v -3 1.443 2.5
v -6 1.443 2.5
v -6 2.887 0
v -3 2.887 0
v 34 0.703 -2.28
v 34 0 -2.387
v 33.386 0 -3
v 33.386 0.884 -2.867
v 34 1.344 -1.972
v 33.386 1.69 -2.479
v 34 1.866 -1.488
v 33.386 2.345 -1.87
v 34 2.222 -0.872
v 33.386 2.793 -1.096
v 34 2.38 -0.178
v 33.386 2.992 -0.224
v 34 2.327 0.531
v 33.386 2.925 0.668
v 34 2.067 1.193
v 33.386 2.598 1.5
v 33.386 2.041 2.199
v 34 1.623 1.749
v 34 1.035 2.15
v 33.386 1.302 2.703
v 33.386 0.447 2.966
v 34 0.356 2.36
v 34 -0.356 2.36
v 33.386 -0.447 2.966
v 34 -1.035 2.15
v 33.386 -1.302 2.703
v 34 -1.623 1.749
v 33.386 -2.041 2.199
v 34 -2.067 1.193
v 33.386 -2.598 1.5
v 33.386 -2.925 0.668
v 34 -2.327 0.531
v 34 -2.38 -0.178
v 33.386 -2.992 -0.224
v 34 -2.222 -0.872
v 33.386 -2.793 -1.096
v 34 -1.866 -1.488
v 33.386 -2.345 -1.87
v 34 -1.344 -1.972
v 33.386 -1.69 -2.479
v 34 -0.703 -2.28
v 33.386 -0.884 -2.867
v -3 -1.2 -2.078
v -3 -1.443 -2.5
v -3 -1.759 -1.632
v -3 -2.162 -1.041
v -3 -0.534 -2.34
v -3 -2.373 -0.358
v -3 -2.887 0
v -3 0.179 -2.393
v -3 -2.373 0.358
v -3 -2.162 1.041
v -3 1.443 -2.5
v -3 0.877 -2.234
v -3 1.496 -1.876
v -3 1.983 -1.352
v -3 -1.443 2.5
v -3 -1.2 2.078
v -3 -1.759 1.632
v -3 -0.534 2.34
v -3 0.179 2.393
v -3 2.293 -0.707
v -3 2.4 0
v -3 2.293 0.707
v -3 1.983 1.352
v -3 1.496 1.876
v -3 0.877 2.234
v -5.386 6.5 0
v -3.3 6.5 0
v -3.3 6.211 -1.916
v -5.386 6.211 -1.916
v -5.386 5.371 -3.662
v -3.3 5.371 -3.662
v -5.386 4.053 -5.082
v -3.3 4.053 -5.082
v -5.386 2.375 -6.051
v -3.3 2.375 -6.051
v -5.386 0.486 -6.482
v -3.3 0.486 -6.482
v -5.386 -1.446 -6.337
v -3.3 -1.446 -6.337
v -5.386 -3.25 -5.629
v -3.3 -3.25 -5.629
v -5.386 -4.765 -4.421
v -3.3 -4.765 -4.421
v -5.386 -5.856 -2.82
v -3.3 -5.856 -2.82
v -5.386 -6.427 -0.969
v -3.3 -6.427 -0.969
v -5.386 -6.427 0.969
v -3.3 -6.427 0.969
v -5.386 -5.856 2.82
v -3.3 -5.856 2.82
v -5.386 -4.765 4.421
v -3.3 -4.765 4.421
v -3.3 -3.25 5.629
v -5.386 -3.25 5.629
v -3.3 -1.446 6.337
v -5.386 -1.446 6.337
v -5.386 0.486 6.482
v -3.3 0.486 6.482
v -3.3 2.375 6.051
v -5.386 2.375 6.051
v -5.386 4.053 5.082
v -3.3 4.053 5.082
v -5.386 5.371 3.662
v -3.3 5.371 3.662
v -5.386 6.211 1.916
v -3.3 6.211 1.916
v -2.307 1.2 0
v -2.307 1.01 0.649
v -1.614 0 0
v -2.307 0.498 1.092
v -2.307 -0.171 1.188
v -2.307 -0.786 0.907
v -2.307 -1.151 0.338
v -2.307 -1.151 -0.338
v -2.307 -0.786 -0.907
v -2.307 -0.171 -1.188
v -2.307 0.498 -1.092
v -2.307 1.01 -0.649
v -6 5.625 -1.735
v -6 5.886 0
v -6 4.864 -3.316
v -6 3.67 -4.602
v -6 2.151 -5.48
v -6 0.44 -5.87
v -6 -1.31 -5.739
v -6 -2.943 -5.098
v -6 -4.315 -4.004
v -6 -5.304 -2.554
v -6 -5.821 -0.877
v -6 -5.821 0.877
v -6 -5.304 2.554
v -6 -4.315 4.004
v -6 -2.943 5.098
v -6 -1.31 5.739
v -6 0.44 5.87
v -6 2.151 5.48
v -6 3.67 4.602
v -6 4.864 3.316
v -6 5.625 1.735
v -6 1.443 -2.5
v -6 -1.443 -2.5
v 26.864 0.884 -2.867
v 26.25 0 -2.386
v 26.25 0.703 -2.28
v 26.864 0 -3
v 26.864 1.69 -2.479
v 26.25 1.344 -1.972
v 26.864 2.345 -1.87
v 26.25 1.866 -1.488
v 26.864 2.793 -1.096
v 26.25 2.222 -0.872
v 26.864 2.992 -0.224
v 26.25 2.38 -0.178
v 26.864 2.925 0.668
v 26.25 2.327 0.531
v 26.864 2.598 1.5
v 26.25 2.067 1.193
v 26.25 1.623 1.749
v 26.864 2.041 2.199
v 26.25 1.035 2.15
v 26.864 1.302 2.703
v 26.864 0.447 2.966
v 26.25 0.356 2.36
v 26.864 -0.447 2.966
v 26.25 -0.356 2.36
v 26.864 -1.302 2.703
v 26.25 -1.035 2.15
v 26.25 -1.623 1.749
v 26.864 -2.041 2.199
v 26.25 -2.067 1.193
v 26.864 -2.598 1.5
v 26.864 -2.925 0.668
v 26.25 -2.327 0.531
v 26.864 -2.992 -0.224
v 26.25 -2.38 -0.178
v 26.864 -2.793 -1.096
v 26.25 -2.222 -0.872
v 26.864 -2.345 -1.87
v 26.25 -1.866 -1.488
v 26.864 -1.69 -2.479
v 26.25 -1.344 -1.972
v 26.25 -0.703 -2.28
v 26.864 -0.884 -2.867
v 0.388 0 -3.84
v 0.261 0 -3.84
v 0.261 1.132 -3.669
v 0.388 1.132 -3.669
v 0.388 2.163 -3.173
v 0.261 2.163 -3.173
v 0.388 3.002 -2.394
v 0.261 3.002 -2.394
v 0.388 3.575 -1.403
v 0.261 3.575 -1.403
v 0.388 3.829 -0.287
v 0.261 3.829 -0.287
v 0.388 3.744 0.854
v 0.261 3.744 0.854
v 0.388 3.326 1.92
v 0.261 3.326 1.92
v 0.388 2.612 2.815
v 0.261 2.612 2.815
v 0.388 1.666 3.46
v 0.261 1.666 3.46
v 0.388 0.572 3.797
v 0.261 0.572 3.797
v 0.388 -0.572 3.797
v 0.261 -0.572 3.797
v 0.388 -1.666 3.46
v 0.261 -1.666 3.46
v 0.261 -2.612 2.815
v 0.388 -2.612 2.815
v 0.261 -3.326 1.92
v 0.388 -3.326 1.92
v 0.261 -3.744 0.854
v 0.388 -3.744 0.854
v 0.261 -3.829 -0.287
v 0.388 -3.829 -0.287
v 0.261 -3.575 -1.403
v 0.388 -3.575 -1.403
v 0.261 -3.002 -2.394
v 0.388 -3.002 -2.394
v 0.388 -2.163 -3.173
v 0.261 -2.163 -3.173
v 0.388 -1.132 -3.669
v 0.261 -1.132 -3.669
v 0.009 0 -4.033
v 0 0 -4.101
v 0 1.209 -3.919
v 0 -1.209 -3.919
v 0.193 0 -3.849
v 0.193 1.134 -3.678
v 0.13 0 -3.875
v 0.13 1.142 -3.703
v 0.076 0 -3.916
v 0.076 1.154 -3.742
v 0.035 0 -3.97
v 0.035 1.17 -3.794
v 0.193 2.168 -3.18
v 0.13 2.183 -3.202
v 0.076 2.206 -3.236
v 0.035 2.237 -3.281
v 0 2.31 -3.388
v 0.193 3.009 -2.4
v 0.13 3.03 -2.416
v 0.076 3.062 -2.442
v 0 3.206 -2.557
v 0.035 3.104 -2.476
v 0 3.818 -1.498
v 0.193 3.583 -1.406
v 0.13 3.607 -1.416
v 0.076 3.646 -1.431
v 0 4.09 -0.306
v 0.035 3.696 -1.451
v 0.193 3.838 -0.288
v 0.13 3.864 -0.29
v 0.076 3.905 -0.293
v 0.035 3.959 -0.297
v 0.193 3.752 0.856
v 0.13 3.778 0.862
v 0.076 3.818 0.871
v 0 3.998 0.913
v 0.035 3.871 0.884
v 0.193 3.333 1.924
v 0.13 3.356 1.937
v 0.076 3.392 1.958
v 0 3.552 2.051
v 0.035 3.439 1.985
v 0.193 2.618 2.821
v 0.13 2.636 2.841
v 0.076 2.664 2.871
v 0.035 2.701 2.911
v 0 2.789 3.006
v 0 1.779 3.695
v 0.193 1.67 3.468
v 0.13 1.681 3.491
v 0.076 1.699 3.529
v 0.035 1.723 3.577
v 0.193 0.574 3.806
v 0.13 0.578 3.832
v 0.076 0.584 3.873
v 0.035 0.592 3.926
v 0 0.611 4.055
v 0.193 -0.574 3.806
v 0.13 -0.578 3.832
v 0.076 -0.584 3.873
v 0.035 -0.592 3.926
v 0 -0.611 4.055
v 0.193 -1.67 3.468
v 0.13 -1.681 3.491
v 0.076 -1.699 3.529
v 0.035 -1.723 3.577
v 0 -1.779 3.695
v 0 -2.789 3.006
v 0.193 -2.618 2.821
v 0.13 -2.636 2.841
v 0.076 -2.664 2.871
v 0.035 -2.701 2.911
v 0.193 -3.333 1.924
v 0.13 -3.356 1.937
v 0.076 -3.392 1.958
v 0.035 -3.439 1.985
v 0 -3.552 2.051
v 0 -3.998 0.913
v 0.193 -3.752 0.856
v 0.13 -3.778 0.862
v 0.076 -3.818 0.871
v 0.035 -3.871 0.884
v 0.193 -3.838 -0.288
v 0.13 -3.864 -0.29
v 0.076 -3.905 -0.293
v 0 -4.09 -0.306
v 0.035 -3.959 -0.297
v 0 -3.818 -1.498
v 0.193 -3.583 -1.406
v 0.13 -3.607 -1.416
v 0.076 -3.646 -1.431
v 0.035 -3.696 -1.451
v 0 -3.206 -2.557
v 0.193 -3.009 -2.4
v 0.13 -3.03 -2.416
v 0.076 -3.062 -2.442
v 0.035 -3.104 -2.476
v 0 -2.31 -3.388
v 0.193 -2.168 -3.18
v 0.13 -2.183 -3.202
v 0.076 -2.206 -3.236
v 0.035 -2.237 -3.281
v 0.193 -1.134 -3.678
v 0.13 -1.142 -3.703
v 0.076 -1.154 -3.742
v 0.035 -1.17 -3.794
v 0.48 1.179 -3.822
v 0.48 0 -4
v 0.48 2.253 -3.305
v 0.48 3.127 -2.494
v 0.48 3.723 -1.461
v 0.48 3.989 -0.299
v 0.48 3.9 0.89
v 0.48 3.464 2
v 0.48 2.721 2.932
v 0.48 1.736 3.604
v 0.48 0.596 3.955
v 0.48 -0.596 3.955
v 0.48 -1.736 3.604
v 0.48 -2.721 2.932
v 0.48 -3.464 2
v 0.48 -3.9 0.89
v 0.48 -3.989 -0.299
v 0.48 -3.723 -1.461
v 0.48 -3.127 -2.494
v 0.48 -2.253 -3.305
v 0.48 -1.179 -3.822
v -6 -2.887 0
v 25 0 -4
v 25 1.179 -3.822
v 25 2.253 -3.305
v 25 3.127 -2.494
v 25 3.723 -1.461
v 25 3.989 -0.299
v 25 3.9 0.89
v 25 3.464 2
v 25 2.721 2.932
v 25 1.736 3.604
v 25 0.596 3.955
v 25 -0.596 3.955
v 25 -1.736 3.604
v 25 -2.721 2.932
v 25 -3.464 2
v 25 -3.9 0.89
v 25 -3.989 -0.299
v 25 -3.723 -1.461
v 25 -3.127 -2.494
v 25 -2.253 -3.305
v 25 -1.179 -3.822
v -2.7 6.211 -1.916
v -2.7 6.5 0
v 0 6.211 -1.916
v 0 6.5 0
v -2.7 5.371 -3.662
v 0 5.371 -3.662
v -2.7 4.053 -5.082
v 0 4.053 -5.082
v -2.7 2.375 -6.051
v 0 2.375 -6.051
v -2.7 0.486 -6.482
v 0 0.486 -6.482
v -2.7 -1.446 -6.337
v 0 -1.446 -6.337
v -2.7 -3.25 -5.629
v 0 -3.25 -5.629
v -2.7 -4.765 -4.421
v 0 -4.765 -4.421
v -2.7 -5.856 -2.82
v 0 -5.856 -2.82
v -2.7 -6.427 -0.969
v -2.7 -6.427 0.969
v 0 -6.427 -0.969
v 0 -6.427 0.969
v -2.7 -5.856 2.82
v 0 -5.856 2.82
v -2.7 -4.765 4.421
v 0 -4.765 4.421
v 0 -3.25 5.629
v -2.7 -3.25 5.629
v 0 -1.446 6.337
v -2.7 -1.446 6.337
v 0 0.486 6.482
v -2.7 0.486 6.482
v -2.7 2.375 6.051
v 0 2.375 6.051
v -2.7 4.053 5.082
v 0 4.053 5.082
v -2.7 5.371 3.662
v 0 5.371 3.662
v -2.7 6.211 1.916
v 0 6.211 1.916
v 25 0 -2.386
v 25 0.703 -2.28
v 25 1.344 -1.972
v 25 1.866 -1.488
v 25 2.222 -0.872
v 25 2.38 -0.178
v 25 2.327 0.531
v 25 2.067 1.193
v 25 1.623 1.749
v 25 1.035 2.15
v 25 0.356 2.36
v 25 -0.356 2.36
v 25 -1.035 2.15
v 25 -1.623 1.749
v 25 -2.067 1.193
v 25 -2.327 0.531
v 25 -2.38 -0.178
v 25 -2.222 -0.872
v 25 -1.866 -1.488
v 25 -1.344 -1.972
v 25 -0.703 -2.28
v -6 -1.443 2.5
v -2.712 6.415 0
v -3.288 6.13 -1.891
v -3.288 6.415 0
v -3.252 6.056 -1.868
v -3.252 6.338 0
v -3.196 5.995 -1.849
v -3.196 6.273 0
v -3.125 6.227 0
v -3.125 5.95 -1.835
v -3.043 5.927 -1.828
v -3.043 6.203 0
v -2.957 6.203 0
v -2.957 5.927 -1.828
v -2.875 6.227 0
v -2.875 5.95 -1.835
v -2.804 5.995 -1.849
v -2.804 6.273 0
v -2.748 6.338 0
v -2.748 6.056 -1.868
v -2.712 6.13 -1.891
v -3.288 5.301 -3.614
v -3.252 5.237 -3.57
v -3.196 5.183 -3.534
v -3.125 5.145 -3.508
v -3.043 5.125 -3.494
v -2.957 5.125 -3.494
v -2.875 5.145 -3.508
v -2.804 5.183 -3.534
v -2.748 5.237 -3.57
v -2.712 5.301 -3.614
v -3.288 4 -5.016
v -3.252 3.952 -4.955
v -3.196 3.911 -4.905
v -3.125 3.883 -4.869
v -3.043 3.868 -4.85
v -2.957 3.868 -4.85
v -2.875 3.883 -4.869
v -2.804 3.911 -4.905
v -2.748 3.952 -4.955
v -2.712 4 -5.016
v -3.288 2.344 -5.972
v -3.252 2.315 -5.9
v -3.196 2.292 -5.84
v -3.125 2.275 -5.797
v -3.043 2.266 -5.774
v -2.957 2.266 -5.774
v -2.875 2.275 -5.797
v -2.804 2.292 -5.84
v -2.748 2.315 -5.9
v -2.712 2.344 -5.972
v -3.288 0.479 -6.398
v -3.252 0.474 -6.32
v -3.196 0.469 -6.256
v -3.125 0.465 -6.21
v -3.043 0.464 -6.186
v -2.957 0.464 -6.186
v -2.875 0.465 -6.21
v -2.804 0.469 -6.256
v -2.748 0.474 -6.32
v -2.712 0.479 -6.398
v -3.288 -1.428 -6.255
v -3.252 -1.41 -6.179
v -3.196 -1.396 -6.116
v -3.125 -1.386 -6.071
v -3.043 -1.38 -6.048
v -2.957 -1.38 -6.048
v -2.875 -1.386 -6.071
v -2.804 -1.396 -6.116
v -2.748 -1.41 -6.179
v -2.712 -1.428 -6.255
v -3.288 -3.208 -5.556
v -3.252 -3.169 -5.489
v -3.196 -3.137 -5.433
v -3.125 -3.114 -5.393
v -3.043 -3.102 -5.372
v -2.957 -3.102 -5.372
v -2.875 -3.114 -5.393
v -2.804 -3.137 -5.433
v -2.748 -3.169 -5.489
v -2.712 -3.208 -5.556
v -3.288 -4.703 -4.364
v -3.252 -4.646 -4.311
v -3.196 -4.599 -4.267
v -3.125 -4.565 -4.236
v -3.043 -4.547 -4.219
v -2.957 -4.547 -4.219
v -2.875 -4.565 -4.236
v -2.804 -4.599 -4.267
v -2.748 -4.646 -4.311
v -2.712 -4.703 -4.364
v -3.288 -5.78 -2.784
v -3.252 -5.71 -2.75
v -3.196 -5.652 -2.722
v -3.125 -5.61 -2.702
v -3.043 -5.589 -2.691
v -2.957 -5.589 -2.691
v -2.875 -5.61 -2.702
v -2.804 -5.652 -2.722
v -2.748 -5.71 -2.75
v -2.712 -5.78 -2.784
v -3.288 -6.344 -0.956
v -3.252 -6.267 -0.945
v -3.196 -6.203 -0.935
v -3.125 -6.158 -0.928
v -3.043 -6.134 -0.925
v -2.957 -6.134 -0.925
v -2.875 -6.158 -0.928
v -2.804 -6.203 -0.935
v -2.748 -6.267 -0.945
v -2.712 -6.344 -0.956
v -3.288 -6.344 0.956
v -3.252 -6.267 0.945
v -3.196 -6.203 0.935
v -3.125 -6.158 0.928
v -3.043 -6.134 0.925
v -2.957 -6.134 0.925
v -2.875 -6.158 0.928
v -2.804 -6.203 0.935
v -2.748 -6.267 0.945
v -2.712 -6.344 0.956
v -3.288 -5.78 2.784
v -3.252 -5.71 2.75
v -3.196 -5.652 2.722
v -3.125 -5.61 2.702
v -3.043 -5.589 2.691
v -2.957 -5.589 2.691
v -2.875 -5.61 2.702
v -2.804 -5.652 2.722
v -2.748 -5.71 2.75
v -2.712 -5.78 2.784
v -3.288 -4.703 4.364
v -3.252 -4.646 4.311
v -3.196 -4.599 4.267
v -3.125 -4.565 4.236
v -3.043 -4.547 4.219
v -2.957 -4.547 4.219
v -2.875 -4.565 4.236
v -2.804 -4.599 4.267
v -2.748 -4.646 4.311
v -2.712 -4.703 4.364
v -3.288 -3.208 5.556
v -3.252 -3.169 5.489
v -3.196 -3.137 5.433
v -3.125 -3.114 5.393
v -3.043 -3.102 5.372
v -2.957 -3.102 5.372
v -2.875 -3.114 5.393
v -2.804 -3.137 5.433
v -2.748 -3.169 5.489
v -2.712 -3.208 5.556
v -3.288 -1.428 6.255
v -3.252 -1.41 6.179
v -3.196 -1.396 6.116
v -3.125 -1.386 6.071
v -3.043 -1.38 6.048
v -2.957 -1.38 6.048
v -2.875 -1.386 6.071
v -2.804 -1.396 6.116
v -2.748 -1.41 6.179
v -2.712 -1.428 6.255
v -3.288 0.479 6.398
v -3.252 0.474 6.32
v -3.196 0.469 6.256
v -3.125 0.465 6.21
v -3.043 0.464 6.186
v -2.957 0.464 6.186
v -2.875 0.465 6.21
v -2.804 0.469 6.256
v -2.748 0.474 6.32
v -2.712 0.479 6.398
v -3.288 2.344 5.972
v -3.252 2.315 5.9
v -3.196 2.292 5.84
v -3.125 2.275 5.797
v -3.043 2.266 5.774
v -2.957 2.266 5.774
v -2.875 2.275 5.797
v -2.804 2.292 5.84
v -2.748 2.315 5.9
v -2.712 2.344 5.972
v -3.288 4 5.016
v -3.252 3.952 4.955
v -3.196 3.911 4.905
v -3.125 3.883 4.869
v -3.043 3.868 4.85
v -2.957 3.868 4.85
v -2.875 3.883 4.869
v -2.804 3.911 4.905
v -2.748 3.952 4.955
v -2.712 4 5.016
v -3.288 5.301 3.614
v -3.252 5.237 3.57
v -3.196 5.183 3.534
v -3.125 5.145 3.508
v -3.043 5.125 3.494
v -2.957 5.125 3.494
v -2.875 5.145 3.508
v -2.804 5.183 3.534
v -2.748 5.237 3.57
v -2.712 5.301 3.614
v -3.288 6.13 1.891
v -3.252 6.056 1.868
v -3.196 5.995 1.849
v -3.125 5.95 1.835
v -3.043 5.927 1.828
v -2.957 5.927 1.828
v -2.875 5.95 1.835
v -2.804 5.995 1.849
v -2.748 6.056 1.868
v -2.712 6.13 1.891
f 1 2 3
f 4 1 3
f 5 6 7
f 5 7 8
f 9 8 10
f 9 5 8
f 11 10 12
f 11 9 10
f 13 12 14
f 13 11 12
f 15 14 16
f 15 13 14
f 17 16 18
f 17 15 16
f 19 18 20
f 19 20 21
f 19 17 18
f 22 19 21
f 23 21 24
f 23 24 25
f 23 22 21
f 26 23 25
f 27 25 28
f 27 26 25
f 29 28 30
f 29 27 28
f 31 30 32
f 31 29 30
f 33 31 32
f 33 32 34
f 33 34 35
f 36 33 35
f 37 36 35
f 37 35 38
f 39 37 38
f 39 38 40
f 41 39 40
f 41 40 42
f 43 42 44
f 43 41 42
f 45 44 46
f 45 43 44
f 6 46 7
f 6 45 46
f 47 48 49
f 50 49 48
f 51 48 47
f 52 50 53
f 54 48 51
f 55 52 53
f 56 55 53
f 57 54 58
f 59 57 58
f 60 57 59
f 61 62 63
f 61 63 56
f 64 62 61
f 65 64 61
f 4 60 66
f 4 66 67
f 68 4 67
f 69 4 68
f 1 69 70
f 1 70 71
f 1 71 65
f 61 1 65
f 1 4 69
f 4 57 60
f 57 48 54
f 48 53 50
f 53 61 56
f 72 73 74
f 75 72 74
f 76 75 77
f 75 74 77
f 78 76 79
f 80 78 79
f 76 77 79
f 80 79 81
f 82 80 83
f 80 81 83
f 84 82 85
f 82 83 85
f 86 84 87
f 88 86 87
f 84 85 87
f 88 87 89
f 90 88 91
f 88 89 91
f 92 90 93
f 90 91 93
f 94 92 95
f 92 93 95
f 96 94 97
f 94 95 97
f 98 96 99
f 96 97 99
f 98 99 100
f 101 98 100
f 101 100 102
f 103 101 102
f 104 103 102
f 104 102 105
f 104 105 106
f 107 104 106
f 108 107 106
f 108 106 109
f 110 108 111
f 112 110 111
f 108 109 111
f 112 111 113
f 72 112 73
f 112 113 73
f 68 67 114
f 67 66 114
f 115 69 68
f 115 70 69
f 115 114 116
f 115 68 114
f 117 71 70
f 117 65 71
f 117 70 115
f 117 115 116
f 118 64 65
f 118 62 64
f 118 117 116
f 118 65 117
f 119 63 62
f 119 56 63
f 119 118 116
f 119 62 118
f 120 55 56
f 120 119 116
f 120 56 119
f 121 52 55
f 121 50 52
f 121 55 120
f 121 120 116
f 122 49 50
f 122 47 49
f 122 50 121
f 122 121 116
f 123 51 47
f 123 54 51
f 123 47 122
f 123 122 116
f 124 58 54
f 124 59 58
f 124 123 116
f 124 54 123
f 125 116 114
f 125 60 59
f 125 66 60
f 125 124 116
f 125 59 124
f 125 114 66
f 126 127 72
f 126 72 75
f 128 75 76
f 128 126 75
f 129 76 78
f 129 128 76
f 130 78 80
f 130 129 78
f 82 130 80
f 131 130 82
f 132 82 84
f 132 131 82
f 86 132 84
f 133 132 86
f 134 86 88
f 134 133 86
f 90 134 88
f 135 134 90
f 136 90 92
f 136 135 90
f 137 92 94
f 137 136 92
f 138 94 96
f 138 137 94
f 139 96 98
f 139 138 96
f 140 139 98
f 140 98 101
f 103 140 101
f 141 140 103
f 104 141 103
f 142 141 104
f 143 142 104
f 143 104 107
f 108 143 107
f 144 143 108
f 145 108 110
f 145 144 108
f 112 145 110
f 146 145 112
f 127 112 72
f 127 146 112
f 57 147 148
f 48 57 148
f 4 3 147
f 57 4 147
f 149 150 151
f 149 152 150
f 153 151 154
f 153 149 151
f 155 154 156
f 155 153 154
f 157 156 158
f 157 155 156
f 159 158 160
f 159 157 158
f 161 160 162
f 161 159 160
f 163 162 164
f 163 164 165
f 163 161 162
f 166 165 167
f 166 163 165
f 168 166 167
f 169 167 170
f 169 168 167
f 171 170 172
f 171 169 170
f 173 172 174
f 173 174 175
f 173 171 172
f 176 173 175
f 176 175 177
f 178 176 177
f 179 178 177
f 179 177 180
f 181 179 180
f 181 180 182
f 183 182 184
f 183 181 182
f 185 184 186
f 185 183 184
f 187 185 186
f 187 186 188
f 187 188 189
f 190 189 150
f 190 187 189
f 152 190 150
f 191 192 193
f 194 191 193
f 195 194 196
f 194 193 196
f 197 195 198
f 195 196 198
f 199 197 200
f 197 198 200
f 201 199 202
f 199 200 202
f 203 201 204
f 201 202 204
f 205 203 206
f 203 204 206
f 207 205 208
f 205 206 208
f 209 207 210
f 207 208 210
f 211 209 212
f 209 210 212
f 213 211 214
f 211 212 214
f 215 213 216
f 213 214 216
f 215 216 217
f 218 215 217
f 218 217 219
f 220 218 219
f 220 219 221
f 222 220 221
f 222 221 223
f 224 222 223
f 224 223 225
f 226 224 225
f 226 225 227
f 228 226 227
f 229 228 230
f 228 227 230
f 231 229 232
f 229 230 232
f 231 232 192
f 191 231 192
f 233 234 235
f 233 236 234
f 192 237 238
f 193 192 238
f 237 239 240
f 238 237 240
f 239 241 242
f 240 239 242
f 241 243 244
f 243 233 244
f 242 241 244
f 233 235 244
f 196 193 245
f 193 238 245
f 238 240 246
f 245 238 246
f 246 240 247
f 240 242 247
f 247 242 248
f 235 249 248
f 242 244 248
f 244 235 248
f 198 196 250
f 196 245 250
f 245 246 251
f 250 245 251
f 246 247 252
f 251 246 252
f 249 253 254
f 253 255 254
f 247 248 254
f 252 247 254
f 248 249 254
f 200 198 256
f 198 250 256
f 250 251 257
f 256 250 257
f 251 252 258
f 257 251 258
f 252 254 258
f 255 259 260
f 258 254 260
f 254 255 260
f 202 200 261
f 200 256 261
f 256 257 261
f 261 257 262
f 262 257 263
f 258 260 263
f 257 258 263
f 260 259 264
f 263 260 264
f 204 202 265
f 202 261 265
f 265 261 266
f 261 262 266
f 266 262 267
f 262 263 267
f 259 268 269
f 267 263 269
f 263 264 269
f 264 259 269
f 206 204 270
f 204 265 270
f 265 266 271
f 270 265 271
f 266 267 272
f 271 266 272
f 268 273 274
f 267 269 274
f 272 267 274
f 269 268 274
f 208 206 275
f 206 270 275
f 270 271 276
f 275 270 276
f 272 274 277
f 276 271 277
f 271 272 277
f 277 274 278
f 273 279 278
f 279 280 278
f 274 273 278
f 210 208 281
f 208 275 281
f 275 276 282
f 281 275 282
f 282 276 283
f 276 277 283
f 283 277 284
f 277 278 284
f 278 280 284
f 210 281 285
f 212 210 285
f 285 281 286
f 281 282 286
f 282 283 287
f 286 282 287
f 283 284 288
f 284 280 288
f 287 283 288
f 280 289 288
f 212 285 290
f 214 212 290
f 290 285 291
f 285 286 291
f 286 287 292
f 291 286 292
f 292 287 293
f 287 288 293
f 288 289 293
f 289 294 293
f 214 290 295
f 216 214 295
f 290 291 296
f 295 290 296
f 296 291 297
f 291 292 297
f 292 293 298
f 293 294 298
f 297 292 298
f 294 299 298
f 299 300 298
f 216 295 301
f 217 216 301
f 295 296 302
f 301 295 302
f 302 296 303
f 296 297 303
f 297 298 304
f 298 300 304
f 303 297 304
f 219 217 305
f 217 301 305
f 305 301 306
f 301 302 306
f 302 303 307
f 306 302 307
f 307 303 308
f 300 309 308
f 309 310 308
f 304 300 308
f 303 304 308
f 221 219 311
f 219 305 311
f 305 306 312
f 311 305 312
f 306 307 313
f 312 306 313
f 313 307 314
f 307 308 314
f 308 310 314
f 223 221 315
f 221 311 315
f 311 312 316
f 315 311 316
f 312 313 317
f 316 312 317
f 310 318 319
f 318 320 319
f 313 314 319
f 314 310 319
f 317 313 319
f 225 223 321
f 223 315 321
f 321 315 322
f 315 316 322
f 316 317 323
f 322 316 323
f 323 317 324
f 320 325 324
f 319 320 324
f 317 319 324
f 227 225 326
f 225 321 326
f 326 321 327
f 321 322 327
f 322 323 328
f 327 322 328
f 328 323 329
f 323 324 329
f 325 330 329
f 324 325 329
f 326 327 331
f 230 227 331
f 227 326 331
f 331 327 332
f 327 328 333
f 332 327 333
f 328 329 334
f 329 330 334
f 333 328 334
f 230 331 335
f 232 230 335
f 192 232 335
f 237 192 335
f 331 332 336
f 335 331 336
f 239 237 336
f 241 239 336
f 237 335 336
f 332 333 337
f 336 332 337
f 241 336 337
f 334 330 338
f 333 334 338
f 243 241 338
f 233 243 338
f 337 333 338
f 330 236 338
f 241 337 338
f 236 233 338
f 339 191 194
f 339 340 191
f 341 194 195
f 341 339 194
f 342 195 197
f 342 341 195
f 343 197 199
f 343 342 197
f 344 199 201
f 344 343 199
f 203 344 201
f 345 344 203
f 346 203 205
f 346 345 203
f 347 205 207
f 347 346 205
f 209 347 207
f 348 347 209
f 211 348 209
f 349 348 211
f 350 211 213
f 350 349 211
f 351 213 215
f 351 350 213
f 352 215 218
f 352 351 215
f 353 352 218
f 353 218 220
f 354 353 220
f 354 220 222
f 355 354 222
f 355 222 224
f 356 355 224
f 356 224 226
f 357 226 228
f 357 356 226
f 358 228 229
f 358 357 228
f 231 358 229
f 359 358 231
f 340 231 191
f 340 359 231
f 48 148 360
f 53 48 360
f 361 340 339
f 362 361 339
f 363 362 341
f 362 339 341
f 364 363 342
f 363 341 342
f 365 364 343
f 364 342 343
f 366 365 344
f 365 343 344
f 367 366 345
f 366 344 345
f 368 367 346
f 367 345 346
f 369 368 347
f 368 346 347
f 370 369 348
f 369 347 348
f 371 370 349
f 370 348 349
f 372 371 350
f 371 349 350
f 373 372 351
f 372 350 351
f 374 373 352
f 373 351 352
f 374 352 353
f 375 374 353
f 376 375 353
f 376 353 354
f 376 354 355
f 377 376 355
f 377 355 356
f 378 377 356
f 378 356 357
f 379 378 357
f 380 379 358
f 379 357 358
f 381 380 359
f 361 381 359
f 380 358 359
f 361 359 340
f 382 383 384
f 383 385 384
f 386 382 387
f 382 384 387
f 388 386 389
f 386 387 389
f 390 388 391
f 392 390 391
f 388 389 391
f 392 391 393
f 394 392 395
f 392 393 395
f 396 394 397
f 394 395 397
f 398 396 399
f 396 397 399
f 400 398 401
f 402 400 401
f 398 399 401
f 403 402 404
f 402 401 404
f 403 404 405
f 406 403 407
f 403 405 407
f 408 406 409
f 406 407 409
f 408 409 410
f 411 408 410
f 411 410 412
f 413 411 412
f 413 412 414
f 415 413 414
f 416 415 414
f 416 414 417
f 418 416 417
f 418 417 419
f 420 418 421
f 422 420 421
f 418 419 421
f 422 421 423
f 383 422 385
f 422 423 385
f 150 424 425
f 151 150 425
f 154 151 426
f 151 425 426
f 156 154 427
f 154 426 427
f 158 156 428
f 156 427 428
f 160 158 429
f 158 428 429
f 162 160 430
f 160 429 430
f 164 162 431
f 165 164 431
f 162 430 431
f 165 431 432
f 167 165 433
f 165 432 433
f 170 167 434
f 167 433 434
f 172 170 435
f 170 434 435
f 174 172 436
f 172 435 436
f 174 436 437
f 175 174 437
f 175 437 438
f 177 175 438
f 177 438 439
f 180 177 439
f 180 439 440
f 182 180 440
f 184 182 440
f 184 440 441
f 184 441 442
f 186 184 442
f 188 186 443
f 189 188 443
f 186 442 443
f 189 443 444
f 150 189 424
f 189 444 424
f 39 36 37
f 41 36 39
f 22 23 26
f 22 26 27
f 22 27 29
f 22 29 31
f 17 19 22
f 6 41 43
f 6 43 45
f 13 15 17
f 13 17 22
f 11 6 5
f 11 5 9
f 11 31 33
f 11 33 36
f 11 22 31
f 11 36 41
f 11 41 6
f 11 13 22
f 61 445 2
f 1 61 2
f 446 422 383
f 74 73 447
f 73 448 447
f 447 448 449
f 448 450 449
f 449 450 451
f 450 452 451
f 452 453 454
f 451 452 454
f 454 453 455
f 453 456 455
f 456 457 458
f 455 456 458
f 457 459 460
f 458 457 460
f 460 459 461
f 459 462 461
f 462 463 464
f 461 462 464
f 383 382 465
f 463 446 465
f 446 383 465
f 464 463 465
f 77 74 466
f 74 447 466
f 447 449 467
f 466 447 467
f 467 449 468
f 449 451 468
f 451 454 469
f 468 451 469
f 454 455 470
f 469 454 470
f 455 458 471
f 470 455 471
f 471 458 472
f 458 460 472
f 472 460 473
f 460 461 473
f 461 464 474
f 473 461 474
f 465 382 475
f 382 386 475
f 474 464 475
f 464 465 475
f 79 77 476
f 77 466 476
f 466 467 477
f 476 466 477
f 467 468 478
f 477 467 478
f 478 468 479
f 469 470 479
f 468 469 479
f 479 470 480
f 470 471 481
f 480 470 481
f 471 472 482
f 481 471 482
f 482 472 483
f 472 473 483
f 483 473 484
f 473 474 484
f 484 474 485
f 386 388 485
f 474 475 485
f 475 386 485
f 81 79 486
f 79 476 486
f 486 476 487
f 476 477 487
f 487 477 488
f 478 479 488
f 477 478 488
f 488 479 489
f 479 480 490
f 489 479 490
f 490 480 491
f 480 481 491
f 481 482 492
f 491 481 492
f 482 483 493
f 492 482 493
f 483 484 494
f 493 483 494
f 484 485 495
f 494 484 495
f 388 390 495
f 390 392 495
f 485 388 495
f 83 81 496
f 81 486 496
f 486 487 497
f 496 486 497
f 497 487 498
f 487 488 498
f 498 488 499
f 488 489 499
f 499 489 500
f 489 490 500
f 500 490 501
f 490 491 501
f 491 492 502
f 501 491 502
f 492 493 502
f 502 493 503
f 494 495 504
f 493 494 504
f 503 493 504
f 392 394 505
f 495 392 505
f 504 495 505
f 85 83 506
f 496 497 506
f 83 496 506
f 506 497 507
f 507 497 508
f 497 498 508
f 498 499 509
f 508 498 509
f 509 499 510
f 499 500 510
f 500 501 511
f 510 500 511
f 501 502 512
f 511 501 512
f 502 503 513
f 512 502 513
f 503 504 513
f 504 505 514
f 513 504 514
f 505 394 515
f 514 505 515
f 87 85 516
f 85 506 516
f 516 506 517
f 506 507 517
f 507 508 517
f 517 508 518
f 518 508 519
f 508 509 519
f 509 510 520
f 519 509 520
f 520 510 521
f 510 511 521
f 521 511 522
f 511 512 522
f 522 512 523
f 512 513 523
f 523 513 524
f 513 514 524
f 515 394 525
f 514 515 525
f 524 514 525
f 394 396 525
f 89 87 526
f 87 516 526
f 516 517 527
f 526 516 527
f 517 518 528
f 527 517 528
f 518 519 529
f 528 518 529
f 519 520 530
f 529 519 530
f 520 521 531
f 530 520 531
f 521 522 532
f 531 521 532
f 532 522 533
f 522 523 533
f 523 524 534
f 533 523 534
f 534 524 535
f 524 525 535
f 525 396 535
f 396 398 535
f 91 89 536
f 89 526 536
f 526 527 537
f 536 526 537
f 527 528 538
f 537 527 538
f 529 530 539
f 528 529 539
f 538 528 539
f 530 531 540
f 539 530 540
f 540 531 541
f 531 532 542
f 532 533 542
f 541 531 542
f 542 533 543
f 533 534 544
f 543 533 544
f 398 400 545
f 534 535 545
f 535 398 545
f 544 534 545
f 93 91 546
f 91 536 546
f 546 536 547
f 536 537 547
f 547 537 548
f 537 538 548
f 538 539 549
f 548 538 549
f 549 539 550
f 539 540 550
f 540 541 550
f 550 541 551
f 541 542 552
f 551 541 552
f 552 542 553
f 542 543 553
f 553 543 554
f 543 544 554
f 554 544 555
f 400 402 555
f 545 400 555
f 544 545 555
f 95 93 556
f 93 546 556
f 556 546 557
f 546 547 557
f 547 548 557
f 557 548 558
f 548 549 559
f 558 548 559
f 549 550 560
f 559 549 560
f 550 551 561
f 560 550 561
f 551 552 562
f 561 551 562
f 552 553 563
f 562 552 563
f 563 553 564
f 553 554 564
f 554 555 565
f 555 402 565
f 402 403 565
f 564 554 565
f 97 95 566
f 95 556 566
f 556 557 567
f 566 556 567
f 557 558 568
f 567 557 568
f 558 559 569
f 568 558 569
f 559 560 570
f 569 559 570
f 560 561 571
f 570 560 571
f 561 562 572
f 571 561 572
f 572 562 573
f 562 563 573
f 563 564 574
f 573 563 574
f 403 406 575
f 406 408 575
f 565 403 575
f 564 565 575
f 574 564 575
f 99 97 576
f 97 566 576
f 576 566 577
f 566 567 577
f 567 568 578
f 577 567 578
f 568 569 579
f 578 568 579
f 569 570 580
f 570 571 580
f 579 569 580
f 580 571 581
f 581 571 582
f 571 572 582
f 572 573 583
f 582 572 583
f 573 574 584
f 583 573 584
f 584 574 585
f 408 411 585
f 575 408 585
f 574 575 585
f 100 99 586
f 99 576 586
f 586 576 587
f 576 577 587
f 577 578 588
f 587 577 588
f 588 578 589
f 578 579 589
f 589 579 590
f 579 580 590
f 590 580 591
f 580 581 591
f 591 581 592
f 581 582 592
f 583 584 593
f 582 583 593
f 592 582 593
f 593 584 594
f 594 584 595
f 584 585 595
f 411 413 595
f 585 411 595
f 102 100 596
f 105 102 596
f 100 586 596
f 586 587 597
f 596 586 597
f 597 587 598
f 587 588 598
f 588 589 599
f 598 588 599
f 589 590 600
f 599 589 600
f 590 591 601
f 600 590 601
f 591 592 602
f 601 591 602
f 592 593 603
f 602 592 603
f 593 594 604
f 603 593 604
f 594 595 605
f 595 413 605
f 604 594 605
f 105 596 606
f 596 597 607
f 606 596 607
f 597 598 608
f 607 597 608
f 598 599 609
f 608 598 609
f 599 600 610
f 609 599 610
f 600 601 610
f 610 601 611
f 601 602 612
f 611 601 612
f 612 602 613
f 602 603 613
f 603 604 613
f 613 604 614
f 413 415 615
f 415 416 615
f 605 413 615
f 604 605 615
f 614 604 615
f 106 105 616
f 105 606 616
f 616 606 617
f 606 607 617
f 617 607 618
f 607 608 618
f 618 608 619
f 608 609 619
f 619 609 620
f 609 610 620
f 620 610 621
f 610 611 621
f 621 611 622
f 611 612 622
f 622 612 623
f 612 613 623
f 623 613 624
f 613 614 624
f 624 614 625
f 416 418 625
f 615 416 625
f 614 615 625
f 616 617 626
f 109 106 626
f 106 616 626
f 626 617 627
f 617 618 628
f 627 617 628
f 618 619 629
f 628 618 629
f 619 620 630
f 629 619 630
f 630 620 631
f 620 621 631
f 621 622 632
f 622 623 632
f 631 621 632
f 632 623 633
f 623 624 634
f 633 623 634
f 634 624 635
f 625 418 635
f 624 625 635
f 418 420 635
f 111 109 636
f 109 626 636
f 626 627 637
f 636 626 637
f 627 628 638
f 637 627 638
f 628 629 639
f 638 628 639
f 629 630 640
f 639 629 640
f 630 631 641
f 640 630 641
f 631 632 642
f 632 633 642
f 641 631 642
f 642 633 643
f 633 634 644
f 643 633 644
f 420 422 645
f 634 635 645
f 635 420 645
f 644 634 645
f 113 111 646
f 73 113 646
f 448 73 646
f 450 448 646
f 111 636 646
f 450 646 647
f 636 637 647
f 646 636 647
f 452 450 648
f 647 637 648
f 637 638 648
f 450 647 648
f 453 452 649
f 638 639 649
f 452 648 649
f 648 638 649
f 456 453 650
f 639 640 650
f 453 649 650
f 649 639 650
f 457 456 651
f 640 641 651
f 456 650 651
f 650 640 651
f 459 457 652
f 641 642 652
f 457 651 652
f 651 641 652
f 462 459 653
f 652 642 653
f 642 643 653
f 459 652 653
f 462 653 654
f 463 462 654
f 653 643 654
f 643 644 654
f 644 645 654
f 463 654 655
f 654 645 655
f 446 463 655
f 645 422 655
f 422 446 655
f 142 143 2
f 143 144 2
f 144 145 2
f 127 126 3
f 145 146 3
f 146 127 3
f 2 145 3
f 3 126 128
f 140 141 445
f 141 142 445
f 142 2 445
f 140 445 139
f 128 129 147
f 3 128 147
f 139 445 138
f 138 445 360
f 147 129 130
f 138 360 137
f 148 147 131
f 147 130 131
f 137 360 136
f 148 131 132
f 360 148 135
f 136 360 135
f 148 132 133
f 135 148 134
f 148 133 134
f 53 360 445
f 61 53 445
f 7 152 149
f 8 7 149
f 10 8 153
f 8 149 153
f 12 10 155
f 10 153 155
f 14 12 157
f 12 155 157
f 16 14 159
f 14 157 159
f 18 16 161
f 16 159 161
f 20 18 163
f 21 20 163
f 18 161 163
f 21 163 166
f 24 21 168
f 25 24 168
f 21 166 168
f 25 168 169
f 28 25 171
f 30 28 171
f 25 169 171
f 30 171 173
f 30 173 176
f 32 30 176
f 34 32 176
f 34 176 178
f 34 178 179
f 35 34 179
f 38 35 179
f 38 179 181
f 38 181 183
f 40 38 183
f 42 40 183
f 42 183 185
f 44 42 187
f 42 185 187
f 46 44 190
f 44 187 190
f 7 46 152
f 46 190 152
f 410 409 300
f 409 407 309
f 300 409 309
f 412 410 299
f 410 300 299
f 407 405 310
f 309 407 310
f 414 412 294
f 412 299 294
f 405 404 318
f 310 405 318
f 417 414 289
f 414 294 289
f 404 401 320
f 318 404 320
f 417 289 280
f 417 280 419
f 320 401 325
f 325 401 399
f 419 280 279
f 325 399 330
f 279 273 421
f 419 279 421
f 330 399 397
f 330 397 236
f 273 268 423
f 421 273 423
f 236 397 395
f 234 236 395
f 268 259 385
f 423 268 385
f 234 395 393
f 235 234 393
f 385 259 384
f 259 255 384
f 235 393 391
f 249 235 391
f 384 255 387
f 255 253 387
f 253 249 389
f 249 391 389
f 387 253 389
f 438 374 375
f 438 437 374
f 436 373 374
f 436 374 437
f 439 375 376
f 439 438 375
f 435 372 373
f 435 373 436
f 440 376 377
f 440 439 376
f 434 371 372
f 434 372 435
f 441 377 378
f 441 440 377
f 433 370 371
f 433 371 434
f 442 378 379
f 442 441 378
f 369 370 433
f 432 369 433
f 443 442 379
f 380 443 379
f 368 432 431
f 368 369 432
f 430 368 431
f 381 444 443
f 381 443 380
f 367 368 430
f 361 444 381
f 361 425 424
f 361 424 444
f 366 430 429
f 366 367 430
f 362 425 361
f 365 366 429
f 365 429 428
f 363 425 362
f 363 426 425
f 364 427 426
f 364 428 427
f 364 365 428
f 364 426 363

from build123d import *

# Parameters (mm, degrees)
SKETCH2_R           = 3.84
BOSS_EXTRUDE1_DEPTH = 0.387623957
SKETCH3_R           = 3.84
BOSS_EXTRUDE2_DEPTH = 0.092376043
BOSS_EXTRUDE2_TAPER = -60.000000004
SKETCH4_R           = 4
BOSS_EXTRUDE3_DEPTH = 24.52
SKETCH5_R           = 2.3865
BOSS_EXTRUDE4_DEPTH = 1.25
SKETCH6_R           = 2.3865
BOSS_EXTRUDE5_DEPTH = 0.6135
BOSS_EXTRUDE5_TAPER = -45
SKETCH7_R           = 3
BOSS_EXTRUDE6_DEPTH = 7.1365
CUT_EXTRUDE1_DEPTH  = 3
CHAMFER1_SIZE       = 0.6135
FILLET1_R           = 0.261


with BuildPart() as part:
    # Sketch1 → Revolve1 (revolve)
    with BuildSketch(Plane(origin=(0, 0, 0), x_dir=(-1, 0, 0), z_dir=(0, 0, -1))):
        with BuildLine():
            Line((0, 6.5), (0, 0))
            Line((0, 0), (6, 0))
            Line((6, 0), (6, 6.5))
            Line((6, 6.5), (3.3, 6.5))
            ThreePointArc((3.3, 6.5), (3, 6.2), (2.7, 6.5))
            Line((2.7, 6.5), (0, 6.5))
        make_face()
    revolve(axis=Axis((0, 0, 0), (-1, 0, 0)))

    # Sketch2 → Boss-Extrude1 (add)
    with BuildSketch(Plane(origin=(0, 0, 0), x_dir=(0, 0, -1), z_dir=(1, 0, 0))):
        Circle(SKETCH2_R)
    extrude(amount=BOSS_EXTRUDE1_DEPTH)

    # Sketch3 → Boss-Extrude2 (add)
    with BuildSketch(Plane(origin=(0.387623957, 0, 0), x_dir=(0, 0, -1), z_dir=(1, 0, 0))):
        Circle(SKETCH3_R)
    extrude(amount=BOSS_EXTRUDE2_DEPTH, taper=BOSS_EXTRUDE2_TAPER)

    # Sketch4 → Boss-Extrude3 (add)
    with BuildSketch(Plane(origin=(0.48, 0, 0), x_dir=(0, 0, -1), z_dir=(1, 0, 0))):
        Circle(SKETCH4_R)
    extrude(amount=BOSS_EXTRUDE3_DEPTH)

    # Sketch5 → Boss-Extrude4 (add)
    with BuildSketch(Plane(origin=(25, 0, 0), x_dir=(0, 0, -1), z_dir=(1, 0, 0))):
        Circle(SKETCH5_R)
    extrude(amount=BOSS_EXTRUDE4_DEPTH)

    # Sketch6 → Boss-Extrude5 (add)
    with BuildSketch(Plane(origin=(26.25, 0, 0), x_dir=(0, 0, -1), z_dir=(1, 0, 0))):
        Circle(SKETCH6_R)
    extrude(amount=BOSS_EXTRUDE5_DEPTH, taper=BOSS_EXTRUDE5_TAPER)

    # Sketch7 → Boss-Extrude6 (add)
    with BuildSketch(Plane(origin=(26.8635, 0, 0), x_dir=(0, 0, -1), z_dir=(1, 0, 0))):
        Circle(SKETCH7_R)
    extrude(amount=BOSS_EXTRUDE6_DEPTH)

    # Sketch8 → Cut-Extrude1 (cut)
    with BuildSketch(Plane.ZY.offset(6)):
        Polygon((2.5, -1.443375673), (2.5, 1.443375673), (0, 2.886751346), (-2.5, 1.443375673), (-2.5, -1.443375673), (0, -2.886751346), align=None)
    extrude(amount=-CUT_EXTRUDE1_DEPTH, mode=Mode.SUBTRACT)

    # Sketch9 → Cut-Revolve1 (revolve, cut)
    with BuildSketch(Plane.XY):
        Polygon((-3, 2.4), (-3, 0), (-1.614359354, 0), align=None)
    revolve(axis=Axis((-3, 0, 0), (1, 0, 0)), mode=Mode.SUBTRACT)

    # Chamfer1
    chamfer1_edges = [part.edges().sort_by_distance(p)[0] for p in [
        (34, 0, 3),
        (-6, -6.5, 0),
    ]]
    chamfer(chamfer1_edges, length=CHAMFER1_SIZE)

    # Fillet1
    fillet1_edges = [part.edges().sort_by_distance(p)[0] for p in [
        (0, 0, 3.84),
    ]]
    fillet(fillet1_edges, radius=FILLET1_R)


solid = part.part
